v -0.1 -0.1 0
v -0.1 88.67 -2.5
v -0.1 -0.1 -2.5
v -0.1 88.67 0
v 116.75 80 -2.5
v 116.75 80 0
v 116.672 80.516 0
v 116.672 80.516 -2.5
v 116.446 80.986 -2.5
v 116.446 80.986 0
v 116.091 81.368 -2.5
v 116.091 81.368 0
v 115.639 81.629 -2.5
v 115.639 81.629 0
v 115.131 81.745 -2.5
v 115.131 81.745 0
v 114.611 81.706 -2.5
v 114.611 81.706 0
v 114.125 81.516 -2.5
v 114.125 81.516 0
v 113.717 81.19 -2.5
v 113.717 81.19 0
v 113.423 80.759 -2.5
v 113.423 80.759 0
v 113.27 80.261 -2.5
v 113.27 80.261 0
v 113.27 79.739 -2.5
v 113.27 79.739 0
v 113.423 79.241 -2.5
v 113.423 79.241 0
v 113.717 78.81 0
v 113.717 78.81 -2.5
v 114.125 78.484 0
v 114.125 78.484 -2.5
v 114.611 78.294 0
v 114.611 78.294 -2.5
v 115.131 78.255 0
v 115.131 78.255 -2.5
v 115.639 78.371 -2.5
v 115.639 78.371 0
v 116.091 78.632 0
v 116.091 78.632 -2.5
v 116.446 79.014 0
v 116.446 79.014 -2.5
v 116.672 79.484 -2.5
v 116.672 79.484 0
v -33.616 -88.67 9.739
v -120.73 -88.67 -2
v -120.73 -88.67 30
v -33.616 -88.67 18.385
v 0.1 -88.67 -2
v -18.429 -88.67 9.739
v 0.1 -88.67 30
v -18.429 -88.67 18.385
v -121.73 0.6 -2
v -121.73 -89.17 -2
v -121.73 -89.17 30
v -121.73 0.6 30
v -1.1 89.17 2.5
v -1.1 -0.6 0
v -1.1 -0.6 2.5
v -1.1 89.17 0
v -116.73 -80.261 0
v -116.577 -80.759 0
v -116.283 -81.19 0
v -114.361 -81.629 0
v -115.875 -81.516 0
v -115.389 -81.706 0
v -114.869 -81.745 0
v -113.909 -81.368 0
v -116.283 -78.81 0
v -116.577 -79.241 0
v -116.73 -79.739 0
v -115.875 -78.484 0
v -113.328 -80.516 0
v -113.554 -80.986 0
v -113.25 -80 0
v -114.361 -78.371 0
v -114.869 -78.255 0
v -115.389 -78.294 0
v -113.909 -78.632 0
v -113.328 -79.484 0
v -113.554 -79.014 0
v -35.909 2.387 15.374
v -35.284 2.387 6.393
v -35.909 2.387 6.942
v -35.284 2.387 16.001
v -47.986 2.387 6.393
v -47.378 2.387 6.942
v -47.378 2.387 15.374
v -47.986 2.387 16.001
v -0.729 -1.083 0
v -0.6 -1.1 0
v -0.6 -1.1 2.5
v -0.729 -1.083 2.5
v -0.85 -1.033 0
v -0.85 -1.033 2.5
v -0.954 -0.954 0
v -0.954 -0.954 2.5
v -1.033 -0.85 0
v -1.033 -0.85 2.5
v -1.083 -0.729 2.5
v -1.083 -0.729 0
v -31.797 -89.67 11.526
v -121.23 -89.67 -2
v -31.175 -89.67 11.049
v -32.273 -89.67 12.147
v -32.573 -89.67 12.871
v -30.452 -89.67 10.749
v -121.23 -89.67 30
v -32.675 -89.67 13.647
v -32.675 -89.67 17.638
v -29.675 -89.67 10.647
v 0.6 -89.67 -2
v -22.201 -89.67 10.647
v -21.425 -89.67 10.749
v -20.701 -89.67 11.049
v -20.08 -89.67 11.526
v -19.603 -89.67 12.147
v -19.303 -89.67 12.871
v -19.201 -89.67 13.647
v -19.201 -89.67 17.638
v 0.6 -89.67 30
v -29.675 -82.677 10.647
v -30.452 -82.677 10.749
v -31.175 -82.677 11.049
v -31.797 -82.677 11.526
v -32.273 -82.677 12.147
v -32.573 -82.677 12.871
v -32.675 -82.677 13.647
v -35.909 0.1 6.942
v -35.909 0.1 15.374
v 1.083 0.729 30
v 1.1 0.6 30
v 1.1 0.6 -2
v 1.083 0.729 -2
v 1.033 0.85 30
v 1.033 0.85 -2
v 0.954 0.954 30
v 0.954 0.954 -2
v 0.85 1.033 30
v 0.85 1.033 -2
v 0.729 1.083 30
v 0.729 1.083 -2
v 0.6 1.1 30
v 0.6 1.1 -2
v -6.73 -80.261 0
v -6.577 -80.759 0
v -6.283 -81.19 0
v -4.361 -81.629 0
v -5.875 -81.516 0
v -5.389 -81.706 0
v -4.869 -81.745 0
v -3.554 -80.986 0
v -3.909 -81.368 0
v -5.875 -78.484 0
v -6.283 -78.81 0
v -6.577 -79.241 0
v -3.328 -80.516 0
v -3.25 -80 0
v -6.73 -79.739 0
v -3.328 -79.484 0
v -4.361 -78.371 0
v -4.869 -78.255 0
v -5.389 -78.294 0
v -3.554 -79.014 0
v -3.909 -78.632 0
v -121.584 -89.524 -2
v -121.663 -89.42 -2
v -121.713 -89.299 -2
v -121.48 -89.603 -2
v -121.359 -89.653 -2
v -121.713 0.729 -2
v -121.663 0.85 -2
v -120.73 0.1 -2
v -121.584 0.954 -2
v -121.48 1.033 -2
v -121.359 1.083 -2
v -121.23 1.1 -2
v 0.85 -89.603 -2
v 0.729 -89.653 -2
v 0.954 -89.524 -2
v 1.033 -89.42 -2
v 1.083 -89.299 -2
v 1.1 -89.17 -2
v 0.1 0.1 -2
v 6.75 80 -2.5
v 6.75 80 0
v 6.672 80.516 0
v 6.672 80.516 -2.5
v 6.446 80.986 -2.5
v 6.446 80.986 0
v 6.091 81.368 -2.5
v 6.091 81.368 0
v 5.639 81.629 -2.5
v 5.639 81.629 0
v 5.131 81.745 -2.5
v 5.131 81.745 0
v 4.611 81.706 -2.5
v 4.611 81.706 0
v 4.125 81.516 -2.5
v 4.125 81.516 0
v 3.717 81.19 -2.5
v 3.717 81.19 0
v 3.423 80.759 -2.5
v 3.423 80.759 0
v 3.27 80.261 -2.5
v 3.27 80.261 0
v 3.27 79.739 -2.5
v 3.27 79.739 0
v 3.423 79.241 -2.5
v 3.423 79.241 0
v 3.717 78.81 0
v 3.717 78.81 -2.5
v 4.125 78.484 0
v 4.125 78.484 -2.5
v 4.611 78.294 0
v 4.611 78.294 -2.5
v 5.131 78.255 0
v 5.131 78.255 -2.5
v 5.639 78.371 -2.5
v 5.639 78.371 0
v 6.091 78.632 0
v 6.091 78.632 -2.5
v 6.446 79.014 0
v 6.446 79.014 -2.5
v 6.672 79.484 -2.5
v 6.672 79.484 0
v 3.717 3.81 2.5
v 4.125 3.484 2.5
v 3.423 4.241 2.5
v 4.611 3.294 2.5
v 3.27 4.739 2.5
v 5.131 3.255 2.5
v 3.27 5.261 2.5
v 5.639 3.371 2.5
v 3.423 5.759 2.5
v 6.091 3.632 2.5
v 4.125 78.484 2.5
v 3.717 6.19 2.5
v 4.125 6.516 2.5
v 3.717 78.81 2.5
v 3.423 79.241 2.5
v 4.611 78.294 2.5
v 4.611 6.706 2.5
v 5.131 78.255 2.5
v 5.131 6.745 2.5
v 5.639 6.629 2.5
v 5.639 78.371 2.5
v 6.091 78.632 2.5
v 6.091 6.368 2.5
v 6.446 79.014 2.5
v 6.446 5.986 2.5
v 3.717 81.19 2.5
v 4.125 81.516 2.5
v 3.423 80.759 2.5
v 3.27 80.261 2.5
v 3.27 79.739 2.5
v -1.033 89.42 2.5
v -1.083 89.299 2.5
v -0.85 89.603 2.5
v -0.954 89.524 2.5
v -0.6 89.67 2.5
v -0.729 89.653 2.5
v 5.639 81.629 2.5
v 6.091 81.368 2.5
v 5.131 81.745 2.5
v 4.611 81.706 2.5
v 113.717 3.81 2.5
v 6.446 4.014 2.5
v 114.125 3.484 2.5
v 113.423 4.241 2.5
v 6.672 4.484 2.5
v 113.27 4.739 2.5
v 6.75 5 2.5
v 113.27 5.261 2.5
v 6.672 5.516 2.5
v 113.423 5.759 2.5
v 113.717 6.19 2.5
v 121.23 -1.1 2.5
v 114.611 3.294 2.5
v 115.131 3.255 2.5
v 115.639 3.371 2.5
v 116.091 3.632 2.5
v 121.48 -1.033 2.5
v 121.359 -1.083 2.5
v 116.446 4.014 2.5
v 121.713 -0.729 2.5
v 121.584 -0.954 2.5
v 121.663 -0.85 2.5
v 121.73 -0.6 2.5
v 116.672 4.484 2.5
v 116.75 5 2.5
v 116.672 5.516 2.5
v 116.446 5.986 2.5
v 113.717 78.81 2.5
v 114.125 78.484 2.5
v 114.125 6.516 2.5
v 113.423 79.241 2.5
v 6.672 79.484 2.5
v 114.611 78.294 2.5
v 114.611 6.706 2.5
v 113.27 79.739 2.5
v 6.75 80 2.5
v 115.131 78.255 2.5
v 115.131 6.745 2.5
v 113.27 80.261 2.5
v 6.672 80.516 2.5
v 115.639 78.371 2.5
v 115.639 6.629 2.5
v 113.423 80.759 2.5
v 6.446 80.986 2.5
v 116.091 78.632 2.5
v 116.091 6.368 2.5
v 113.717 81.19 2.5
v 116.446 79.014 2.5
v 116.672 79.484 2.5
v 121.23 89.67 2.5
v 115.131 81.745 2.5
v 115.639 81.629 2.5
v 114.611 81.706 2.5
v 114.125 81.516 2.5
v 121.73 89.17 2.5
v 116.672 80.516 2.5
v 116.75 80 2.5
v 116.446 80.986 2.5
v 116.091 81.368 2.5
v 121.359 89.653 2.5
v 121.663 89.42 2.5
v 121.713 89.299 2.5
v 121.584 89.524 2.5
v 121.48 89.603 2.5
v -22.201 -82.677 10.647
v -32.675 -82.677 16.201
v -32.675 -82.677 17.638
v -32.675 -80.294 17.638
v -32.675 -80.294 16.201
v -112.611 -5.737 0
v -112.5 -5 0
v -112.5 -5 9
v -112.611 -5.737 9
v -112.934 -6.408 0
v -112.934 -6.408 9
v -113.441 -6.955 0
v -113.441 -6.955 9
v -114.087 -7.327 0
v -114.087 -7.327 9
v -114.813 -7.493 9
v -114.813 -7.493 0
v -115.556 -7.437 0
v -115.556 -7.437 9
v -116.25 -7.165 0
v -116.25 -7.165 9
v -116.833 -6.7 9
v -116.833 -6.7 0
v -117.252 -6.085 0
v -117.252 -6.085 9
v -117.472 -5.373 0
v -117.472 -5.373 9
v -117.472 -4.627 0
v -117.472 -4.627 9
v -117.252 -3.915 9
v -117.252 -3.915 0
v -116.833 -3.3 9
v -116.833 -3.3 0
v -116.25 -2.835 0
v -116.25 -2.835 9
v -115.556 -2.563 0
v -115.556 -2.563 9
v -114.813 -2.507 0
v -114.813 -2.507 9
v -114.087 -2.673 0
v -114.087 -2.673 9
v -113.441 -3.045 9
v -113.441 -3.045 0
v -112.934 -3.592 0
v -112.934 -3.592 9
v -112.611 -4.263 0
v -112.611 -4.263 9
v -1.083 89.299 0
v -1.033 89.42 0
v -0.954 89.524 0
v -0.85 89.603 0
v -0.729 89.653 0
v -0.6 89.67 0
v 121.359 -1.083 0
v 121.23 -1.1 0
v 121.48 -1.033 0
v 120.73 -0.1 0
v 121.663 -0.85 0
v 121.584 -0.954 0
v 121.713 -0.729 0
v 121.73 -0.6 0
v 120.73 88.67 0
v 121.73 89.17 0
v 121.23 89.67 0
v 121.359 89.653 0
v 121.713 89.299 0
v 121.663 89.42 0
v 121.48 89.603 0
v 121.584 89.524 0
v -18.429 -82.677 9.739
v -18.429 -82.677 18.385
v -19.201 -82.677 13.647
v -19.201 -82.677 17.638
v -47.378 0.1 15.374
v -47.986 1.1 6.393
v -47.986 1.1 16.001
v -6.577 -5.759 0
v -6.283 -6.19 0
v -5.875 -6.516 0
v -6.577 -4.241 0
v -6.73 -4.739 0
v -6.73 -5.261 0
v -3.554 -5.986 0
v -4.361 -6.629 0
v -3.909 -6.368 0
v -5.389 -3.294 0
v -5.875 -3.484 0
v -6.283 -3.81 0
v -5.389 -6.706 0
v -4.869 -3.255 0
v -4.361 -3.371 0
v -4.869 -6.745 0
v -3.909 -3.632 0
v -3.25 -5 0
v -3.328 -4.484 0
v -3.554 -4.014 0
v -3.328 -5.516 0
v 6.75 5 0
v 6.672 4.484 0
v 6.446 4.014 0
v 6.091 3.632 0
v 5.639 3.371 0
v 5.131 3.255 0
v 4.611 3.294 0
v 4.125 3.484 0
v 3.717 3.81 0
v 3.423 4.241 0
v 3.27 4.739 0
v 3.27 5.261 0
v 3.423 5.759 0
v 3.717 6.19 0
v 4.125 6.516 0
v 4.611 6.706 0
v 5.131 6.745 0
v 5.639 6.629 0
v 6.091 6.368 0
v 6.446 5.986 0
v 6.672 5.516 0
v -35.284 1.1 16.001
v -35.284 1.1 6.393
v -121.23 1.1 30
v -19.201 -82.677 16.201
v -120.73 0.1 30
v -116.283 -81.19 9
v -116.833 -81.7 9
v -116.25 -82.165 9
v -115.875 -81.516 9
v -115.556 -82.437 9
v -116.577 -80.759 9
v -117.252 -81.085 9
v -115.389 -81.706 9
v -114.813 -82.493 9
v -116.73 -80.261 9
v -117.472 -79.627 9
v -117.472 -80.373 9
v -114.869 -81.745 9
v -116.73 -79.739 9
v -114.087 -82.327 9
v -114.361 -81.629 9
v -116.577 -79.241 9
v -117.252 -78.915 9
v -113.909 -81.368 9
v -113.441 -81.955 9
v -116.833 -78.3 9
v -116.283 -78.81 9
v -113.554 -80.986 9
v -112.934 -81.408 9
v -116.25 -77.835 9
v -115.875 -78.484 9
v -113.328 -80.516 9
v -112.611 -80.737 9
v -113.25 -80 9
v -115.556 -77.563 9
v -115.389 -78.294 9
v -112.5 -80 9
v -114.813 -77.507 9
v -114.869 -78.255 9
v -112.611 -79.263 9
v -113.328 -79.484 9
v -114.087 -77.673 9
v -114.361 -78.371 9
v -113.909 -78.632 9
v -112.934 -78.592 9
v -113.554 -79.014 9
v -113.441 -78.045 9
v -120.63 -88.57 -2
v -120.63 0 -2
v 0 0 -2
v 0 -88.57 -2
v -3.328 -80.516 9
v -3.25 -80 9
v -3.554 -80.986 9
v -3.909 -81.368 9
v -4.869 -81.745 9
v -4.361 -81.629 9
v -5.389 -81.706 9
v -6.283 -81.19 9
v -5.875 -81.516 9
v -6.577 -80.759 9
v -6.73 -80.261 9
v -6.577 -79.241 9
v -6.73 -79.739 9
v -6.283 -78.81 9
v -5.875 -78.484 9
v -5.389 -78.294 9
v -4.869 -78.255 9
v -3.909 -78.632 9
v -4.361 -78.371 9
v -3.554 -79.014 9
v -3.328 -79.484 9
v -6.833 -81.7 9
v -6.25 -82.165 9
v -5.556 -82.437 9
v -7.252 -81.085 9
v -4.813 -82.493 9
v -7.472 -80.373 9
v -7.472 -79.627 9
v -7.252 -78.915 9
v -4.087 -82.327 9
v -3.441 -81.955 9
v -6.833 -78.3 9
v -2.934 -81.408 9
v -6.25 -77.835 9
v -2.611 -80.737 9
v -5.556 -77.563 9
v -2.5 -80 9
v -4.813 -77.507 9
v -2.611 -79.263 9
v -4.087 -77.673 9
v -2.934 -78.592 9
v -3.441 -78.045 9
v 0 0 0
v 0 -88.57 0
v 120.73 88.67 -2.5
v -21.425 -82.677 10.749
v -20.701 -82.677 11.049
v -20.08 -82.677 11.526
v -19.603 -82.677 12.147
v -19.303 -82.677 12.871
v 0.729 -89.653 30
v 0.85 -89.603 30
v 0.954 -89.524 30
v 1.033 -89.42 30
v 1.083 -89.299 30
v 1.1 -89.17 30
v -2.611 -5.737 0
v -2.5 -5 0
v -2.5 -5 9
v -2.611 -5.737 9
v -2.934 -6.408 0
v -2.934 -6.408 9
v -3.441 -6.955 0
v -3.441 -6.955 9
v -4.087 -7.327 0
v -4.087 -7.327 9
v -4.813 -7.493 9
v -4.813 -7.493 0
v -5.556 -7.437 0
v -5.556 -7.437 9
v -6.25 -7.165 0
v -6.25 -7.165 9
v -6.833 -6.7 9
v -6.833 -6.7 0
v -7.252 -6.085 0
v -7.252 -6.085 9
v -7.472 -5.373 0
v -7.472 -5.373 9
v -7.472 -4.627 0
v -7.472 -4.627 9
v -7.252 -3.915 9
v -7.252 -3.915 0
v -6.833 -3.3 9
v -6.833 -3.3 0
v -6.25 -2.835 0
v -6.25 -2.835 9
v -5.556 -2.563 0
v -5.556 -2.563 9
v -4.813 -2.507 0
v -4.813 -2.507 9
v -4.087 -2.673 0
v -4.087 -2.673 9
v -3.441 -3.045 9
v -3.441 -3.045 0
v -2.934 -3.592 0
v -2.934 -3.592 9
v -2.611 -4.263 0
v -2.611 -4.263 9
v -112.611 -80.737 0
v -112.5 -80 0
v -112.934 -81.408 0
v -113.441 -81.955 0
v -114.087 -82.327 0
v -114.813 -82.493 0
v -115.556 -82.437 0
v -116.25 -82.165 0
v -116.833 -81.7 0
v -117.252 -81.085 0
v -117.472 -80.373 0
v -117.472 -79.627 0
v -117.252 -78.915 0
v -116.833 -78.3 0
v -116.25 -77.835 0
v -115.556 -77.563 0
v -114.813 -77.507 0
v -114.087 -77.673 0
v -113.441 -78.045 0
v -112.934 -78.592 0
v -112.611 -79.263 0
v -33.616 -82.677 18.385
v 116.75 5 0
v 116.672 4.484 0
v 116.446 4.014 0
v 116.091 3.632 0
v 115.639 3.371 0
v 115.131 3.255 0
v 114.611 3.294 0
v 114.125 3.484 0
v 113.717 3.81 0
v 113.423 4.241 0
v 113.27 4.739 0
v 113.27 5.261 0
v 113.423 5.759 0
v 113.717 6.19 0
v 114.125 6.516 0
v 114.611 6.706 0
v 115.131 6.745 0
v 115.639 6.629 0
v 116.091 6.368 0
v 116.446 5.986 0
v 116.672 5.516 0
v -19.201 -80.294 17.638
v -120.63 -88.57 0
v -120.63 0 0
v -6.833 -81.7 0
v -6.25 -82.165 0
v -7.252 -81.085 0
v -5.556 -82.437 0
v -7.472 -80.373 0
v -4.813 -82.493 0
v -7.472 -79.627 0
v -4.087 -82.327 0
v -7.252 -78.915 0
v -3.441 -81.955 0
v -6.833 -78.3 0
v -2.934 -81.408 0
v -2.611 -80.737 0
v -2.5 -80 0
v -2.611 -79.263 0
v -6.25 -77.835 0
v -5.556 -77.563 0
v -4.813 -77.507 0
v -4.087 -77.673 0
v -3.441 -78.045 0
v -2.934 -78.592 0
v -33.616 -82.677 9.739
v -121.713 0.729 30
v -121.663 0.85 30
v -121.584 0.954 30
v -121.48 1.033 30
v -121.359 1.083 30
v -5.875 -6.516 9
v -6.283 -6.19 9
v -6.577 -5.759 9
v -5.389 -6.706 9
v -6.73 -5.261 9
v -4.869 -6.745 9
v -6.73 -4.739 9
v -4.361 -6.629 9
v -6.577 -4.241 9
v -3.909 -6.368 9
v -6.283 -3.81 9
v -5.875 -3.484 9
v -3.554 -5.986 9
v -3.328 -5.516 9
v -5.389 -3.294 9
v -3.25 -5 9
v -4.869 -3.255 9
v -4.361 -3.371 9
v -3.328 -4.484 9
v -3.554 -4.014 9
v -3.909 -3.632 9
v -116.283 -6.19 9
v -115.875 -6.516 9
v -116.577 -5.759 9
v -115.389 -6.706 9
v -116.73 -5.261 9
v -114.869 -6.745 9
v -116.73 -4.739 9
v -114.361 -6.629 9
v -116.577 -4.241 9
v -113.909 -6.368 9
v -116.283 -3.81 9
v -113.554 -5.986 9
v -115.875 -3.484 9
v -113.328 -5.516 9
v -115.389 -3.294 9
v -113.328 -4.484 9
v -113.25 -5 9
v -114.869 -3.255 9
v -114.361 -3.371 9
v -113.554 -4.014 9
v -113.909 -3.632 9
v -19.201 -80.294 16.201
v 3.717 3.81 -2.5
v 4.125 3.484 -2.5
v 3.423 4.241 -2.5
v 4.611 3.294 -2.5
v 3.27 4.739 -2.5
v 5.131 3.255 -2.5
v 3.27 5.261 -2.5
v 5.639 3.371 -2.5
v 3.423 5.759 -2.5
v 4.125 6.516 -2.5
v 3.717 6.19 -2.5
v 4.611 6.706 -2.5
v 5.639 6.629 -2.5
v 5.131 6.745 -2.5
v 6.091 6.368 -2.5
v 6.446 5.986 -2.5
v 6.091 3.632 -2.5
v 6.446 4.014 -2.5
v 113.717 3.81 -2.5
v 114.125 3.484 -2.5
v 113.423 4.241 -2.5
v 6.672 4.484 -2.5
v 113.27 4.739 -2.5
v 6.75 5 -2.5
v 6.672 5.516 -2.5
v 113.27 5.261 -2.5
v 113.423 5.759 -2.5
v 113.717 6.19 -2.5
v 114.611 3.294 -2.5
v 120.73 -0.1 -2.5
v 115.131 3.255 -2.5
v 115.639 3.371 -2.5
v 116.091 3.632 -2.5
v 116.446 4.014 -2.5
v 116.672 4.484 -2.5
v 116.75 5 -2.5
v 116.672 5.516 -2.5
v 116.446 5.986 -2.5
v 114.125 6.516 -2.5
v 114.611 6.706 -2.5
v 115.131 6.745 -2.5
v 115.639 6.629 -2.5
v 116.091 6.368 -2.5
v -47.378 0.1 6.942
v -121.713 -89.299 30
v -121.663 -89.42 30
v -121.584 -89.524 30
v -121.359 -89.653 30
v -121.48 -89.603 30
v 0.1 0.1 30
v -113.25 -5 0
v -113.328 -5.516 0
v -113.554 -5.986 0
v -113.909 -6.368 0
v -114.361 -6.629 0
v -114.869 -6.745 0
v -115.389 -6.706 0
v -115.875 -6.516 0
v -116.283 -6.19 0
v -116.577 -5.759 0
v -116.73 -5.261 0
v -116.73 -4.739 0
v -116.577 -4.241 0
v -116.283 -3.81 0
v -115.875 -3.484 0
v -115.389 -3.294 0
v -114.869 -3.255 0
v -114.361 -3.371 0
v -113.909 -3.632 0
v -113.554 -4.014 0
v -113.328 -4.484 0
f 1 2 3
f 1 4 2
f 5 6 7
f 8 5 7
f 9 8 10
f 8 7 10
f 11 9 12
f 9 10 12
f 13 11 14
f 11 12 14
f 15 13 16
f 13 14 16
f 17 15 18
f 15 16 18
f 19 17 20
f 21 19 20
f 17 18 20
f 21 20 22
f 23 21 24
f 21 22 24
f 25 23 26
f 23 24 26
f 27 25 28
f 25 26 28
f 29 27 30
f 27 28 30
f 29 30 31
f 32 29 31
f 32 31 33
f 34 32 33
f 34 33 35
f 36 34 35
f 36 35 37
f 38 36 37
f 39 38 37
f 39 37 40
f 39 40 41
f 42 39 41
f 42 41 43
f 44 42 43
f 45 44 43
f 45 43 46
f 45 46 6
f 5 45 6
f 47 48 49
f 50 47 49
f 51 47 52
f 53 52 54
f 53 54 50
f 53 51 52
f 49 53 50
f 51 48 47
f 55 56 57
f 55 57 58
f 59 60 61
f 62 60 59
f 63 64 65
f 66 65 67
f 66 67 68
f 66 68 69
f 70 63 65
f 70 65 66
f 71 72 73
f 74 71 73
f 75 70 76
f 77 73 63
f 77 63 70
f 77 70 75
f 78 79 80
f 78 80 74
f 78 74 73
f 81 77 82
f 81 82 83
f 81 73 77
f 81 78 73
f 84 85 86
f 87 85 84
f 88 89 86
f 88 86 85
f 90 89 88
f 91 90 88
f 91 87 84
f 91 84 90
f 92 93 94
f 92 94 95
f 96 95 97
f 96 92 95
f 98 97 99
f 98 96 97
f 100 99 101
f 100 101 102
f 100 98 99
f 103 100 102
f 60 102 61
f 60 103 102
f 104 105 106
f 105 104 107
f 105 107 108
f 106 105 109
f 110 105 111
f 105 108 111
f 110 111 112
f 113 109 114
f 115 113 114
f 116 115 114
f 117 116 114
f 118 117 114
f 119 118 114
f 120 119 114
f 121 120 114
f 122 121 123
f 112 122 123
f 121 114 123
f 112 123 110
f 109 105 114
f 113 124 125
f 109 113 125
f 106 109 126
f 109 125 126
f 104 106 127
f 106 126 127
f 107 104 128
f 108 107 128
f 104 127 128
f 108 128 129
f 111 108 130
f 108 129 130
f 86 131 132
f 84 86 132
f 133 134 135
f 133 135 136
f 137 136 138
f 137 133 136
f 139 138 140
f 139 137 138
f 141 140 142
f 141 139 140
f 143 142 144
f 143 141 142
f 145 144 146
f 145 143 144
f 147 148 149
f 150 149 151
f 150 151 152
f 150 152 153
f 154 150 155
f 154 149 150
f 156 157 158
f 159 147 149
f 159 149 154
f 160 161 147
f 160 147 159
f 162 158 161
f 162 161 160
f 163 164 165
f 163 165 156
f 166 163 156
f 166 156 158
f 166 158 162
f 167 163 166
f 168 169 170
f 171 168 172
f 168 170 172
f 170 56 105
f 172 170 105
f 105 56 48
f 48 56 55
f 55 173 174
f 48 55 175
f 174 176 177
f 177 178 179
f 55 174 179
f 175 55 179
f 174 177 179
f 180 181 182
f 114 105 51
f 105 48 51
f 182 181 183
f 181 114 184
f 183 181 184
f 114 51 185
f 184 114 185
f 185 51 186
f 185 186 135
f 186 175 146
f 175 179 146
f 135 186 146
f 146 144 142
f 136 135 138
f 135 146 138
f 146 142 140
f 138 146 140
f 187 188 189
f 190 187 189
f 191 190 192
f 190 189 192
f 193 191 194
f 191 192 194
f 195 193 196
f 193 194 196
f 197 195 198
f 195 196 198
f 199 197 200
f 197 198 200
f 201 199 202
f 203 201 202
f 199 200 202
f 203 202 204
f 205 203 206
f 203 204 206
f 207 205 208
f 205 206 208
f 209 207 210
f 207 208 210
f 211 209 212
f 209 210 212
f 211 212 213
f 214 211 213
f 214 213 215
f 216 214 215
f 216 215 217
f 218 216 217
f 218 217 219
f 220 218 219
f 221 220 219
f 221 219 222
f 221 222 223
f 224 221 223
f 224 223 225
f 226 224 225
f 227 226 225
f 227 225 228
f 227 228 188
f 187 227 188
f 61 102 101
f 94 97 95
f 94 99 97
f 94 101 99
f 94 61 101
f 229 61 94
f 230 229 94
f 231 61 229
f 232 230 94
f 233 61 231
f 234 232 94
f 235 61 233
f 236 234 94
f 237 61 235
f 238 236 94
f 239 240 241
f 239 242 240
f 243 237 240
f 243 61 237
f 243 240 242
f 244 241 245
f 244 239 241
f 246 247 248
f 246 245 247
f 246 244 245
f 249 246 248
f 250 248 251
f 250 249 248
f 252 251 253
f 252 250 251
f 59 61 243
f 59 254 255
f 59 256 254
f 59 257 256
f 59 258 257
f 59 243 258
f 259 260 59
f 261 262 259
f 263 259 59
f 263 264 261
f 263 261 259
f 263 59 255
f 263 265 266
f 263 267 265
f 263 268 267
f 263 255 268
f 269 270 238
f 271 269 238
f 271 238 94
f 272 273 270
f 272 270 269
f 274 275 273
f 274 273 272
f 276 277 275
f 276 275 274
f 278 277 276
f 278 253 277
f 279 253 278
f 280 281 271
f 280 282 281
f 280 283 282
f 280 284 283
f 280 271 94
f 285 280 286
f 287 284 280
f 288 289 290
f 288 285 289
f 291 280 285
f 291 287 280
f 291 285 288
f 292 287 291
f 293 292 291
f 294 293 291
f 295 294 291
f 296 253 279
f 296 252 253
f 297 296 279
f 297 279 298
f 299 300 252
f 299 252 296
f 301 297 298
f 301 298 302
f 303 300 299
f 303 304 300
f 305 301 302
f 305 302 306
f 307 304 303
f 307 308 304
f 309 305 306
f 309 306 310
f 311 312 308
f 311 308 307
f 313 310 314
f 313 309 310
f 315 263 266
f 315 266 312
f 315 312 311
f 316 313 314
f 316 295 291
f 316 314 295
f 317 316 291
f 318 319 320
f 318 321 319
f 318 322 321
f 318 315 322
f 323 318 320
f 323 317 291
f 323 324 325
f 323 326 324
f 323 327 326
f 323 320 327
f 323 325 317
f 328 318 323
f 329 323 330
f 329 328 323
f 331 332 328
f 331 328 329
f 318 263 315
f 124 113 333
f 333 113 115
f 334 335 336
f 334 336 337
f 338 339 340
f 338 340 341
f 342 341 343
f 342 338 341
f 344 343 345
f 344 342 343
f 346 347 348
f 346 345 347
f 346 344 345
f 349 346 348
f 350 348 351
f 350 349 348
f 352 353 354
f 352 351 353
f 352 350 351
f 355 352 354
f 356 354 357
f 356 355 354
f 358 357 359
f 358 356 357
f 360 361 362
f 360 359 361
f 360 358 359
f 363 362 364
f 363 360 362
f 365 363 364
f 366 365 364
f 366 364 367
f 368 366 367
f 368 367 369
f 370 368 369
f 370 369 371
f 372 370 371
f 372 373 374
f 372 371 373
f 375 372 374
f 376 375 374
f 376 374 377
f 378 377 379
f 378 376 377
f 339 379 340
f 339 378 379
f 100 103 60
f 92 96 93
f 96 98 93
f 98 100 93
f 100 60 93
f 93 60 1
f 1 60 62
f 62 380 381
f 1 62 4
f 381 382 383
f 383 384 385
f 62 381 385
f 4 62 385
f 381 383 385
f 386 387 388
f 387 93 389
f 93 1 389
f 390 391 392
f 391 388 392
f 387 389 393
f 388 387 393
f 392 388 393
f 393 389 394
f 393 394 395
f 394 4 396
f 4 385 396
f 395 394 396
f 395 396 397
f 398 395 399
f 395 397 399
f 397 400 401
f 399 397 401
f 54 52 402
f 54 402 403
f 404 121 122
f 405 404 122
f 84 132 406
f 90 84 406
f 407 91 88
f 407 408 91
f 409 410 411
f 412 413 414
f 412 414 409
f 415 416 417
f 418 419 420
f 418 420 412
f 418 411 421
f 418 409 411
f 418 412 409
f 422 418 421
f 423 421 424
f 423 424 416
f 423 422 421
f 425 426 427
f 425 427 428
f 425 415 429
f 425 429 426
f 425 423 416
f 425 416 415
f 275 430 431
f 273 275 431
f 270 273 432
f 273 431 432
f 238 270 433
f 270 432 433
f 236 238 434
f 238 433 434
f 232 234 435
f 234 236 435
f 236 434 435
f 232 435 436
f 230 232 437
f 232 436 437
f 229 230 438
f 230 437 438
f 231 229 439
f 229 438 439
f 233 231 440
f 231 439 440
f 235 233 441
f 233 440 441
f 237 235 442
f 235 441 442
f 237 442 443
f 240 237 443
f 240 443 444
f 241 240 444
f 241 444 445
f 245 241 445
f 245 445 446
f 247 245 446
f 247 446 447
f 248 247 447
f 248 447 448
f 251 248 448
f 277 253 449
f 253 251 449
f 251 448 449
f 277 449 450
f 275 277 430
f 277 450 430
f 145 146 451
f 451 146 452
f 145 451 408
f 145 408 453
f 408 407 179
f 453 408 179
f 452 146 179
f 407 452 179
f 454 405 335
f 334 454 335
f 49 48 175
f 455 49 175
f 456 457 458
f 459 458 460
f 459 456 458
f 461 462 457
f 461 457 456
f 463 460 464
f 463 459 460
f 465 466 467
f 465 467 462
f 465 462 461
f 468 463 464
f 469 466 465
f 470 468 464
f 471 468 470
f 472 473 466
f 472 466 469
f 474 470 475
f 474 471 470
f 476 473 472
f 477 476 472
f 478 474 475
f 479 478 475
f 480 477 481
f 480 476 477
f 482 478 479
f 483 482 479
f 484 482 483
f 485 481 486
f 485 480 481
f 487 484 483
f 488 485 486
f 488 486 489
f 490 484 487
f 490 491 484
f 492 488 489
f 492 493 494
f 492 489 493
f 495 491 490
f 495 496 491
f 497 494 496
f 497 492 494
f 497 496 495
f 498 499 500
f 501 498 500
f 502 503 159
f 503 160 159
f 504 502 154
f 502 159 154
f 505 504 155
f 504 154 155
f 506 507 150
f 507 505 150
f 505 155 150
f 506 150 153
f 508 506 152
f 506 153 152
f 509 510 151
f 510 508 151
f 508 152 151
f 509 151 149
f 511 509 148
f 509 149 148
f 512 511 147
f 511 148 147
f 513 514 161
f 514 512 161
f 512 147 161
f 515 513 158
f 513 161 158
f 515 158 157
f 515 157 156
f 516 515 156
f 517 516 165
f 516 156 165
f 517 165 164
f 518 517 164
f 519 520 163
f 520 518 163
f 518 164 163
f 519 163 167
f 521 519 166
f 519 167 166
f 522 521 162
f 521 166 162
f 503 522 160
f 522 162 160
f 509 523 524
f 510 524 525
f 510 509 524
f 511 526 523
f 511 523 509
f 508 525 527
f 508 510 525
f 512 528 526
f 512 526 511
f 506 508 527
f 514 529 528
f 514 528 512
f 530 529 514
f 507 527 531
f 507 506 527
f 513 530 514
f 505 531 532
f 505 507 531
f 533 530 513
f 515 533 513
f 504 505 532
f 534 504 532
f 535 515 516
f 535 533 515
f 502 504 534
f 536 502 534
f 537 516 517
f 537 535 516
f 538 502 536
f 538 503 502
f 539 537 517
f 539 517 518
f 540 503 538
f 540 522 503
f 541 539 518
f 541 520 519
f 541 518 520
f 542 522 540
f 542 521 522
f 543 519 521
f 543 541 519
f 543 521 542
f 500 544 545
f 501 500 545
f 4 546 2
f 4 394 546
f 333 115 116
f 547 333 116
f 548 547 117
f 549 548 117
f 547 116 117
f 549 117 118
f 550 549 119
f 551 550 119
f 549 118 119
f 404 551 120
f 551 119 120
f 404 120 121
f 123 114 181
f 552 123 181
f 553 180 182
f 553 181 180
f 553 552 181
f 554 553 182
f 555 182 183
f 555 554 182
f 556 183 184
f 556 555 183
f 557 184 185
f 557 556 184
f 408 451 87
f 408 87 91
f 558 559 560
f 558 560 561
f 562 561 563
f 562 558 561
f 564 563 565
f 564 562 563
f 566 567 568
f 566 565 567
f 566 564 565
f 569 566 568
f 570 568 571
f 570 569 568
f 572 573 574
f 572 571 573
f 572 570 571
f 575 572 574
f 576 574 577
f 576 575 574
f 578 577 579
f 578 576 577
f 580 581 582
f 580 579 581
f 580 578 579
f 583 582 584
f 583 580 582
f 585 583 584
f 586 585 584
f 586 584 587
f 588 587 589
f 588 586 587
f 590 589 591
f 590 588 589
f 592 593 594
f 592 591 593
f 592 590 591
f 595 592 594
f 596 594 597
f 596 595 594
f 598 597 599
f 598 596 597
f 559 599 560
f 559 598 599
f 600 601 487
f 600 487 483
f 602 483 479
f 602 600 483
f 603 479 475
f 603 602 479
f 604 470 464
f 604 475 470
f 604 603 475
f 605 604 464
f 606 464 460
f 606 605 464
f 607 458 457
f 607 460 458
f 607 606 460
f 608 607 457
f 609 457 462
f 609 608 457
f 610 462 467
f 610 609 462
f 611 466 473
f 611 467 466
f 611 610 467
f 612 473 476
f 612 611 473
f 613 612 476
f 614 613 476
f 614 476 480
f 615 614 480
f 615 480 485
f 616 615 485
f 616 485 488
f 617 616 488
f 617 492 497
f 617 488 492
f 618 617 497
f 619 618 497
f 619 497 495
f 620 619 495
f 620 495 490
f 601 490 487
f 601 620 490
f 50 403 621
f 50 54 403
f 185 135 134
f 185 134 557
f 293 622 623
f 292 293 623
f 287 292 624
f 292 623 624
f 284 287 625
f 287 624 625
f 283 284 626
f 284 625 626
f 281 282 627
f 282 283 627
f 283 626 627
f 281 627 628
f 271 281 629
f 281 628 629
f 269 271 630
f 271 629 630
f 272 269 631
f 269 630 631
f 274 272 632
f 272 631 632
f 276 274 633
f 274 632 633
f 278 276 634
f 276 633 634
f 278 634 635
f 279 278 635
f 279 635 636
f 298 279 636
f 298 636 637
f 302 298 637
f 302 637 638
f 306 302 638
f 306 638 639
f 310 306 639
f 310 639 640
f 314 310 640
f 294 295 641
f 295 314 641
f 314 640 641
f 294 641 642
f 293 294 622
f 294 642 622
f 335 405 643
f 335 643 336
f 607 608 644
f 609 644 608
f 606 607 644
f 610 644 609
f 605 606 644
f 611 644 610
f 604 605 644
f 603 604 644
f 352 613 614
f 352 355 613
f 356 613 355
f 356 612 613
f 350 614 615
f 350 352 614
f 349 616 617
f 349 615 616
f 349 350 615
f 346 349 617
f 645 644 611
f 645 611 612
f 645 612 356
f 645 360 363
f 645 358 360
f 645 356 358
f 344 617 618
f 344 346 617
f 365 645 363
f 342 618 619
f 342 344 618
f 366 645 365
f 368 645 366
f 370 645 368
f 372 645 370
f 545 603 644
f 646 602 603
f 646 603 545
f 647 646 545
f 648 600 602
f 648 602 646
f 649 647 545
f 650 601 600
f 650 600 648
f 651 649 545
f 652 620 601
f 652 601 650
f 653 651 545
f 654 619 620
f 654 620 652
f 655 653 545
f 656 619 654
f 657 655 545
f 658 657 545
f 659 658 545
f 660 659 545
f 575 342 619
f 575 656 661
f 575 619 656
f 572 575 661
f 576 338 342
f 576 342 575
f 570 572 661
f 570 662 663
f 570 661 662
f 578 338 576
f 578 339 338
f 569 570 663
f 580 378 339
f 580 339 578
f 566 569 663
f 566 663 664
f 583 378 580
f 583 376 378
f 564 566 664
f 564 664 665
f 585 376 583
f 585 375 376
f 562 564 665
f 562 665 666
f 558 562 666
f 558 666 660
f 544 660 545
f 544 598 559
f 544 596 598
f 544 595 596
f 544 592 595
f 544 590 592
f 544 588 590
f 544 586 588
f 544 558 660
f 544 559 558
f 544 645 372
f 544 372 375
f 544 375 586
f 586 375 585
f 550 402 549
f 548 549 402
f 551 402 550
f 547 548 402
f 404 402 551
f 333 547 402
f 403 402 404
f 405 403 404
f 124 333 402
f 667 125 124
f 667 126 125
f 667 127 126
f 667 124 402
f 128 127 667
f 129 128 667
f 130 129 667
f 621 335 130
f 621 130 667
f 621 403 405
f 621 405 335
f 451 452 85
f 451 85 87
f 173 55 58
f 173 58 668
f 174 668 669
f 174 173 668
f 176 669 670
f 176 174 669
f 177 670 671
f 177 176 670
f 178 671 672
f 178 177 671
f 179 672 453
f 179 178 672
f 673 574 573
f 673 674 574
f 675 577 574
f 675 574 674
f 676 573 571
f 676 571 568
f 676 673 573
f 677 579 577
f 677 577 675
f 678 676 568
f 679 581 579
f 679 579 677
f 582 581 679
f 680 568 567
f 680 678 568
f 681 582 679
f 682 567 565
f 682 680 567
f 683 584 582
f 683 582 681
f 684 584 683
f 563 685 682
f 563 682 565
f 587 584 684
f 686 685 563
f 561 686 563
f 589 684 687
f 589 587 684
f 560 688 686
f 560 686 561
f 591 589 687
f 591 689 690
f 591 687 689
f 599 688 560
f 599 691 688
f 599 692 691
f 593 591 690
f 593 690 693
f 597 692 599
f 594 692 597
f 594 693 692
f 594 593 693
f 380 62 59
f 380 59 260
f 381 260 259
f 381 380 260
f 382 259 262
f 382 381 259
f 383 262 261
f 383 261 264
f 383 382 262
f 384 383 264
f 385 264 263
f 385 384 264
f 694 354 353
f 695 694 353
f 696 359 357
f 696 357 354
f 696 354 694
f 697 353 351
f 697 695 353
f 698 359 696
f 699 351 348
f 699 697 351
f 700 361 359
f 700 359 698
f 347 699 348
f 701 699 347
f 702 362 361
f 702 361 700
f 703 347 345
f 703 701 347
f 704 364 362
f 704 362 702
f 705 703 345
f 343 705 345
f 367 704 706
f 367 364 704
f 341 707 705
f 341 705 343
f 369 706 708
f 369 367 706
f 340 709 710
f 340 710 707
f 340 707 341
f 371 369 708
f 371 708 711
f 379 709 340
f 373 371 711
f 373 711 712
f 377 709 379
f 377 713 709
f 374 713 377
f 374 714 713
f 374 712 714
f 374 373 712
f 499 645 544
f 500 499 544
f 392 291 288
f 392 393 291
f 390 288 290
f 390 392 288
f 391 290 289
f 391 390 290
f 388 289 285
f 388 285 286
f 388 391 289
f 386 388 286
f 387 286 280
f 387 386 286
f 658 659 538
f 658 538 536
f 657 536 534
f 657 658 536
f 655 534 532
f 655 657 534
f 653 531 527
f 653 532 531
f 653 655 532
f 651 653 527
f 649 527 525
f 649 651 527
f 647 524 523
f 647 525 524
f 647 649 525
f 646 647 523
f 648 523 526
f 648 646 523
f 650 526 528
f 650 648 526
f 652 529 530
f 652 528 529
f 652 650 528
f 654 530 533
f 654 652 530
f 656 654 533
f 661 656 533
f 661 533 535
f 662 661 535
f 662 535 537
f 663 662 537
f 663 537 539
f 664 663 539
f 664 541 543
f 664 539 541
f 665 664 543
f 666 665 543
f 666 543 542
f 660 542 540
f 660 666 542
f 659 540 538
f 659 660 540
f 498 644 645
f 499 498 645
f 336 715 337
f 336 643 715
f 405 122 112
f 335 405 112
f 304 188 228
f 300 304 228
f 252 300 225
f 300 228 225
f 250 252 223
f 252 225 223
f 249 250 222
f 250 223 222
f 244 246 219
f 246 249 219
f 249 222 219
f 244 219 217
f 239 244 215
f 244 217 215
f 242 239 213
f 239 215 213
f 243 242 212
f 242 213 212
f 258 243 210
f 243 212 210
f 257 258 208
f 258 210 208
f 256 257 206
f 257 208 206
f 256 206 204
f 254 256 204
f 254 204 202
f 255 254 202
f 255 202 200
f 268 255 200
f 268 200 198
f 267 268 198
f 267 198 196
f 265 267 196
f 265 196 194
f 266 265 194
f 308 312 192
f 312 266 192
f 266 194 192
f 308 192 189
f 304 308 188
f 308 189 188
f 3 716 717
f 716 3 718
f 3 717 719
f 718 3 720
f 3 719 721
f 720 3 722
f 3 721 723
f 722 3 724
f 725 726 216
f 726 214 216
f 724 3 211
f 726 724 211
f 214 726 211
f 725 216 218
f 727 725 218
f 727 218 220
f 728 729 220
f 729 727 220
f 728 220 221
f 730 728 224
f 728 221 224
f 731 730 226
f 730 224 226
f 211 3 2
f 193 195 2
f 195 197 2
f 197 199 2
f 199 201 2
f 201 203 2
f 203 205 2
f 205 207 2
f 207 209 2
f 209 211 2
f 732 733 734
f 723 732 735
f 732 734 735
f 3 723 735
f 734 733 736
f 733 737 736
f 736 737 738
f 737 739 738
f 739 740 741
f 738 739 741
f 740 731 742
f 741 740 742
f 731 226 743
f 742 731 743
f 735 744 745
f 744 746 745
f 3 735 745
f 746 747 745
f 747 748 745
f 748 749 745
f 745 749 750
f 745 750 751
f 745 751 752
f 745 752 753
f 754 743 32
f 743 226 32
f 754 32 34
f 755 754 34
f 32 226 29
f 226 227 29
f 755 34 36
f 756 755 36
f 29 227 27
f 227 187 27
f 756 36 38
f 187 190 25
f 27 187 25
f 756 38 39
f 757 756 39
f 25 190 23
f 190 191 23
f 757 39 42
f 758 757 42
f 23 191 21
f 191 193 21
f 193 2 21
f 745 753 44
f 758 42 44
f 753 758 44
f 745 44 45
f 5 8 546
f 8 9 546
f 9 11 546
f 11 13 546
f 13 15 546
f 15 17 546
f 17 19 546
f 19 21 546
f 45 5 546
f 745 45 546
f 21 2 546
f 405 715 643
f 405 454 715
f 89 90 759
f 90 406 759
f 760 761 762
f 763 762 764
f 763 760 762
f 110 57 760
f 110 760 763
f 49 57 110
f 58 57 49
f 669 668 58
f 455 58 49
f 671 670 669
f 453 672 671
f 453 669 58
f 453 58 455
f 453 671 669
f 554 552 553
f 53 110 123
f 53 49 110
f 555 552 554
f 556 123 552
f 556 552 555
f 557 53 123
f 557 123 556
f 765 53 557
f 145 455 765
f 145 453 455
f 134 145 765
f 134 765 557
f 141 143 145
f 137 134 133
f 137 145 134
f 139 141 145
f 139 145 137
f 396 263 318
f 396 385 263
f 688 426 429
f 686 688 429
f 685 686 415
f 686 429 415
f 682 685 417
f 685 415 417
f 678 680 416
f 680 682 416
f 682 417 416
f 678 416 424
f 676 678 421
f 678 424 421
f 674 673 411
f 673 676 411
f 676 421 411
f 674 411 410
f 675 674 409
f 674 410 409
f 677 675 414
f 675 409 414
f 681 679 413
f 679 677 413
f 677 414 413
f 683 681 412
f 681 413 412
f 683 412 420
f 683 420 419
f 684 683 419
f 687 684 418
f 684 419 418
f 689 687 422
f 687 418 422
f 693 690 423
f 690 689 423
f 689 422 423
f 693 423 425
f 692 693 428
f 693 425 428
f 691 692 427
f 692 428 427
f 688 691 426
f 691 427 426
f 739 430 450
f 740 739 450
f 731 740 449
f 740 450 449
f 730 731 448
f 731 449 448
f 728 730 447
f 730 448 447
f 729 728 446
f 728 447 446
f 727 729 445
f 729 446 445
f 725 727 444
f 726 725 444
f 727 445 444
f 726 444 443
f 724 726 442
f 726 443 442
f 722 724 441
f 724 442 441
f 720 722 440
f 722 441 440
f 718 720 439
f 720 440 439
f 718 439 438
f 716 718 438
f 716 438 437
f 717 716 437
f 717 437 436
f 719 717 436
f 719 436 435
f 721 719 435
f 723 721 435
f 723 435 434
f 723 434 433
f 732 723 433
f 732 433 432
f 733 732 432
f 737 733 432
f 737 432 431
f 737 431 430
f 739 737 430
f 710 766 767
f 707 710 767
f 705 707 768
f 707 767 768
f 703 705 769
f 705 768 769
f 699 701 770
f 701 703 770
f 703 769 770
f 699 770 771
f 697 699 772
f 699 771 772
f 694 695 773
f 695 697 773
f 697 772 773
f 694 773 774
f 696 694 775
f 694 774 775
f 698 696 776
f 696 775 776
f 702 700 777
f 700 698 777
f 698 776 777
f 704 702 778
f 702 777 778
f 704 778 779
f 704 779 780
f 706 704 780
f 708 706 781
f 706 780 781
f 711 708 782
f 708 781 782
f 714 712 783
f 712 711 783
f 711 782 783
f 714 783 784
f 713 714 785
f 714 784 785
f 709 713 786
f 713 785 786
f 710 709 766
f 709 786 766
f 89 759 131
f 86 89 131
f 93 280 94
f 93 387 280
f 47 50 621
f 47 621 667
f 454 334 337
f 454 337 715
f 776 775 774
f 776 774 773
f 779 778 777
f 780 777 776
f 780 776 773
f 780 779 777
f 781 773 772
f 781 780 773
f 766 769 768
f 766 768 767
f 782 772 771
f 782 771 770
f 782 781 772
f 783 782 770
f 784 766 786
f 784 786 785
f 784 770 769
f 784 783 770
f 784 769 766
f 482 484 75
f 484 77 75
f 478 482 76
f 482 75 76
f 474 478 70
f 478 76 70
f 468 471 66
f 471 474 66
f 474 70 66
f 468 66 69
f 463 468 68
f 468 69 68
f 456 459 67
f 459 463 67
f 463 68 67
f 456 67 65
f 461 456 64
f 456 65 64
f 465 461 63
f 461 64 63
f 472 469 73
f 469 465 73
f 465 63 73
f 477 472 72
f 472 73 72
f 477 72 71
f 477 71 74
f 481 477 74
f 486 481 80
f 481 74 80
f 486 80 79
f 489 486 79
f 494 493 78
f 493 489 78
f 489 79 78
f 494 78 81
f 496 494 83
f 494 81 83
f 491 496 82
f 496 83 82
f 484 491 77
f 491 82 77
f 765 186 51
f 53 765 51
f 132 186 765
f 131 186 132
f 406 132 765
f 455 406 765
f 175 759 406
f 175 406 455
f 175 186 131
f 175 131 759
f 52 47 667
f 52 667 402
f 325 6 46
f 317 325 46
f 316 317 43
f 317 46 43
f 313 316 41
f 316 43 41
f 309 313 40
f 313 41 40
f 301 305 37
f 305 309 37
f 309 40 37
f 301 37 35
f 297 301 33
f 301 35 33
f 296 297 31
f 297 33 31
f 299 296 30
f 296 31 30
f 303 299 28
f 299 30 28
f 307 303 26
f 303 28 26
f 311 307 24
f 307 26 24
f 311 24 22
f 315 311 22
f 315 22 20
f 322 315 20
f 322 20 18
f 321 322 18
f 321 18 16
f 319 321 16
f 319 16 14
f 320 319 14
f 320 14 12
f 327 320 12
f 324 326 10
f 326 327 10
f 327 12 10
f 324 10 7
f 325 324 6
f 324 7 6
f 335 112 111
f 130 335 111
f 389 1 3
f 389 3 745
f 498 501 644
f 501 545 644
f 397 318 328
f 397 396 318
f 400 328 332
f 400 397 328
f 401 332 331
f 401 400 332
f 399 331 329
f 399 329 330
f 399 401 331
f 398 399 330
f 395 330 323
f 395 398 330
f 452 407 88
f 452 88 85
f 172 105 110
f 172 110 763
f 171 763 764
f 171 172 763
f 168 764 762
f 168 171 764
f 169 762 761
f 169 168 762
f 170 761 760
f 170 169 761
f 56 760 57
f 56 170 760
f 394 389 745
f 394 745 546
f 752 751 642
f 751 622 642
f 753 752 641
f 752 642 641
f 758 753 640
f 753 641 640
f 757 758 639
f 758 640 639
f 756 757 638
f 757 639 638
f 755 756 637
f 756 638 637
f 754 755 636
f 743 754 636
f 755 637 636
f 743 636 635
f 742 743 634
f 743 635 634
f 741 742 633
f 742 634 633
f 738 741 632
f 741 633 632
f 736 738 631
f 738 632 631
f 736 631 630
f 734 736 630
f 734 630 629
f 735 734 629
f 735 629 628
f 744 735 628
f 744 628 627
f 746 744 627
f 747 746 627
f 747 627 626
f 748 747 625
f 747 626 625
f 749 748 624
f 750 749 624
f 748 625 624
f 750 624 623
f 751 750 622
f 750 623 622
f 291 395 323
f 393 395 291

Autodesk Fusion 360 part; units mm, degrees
sketch "Sketch 2" plane through (0, 0, 0) normal (0, 0, 1) x (1, 0, 0)
  circle A0 centre (5, 80) radius 1.75
  line L0 (-0.1, -0.1) -> (120.73, -0.1)
  arc A1 (-0.6, -1.1) -> (-1.1, -0.6) centre (-0.6, -0.6) cw
  line L1 (-1.1, -0.6) -> (-1.1, 89.17)
  arc A2 (-1.1, 89.17) -> (-0.6, 89.67) centre (-0.6, 89.17) cw
  line L2 (121.73, 89.17) -> (121.73, -0.6)
  circle A3 centre (115, 80) radius 1.75
  line L3 (120.73, -0.1) -> (120.73, 88.67)
  line L4 (120.73, 88.67) -> (-0.1, 88.67)
  circle A4 centre (115, 5) radius 1.75
  circle A5 centre (5, 5) radius 1.75
  line L5 (121.23, -1.1) -> (-0.6, -1.1)
  arc A6 (121.23, 89.67) -> (121.73, 89.17) centre (121.23, 89.17) cw
  line L6 (-0.1, 88.67) -> (-0.1, -0.1)
  arc A7 (121.73, -0.6) -> (121.23, -1.1) centre (121.23, -0.6) cw
  line L7 (-0.6, 89.67) -> (121.23, 89.67)
  line L8 (-0.1, 88.67) -> (120.73, 88.67)
  line L9 (120.73, 88.67) -> (120.73, -0.1)
  line L10 (120.73, -0.1) -> (-0.1, -0.1)
  line L11 (-0.1, -0.1) -> (-0.1, 88.67)
  dimension "d1" = 1
extrude "Extrude1" add sketch "Sketch 2" along normal blind 2.5 contours L0 L3 L4 L6 L8 L9 L10 L11 | A1 L1 A2 L2 L5 A6 A7 L7
extrude "Extrude2" add sketch "Sketch 2" against normal blind 2.5 contours L0 L3 L4 L6 L8 L9 L10 L11

Autodesk Fusion 360 part; units mm, degrees
sketch "Sketch 1" plane through (0, 0, 0) normal (0, 0, 1) x (1, 0, 0)
  line L0 (-120.63, -88.57) -> (-120.63, 0)
  circle A0 centre (-115, -5) radius 1.75
  line L1 (0, 0) -> (0, -88.57)
  circle A1 centre (-115, -80) radius 1.75
  line L2 (-120.63, 0) -> (0, 0)
  circle A2 centre (-5, -80) radius 1.75
  line L3 (0, -88.57) -> (-120.63, -88.57)
  circle A3 centre (-5, -5) radius 1.75
  line L4 (0.1, -88.67) -> (-120.73, -88.67)
  line L5 (-120.73, -88.67) -> (-120.73, 0.1)
  line L6 (-120.73, 0.1) -> (0.1, 0.1)
  line L7 (0.1, 0.1) -> (0.1, -88.67)
  line L8 (1.1, -89.67) -> (-121.73, -89.67)
  line L9 (-121.73, -89.67) -> (-121.73, 1.1)
  line L10 (-121.73, 1.1) -> (1.1, 1.1)
  line L11 (1.1, 1.1) -> (1.1, -89.67)
  circle A4 centre (-115, -5) radius 2.5
  circle A5 centre (-115, -80) radius 2.5
  circle A6 centre (-5, -80) radius 2.5
  circle A7 centre (-5, -5) radius 2.5
  dimension "d1" = -0.1
  dimension "d2" = -1.1
  dimension "d7" = 5
  dimension "d8" = 5
  dimension "d9" = 5
  dimension "d10" = 5
extrude "Extrude1" add sketch "Sketch 1" against normal blind 2 contours L0 L1 L2 L3 | A0 | A1 | A2 | A3 | L8 L9 L10 L11 | A4 | A5 | A6 | A7 makes body 1 at (-40.21, -29.5233, 0) makes body 2 at (-40.1767, 0.7667, 0)
extrude "Extrude2" add sketch "Sketch 1" along normal blind 35 contours L8 L9 L10 L11 bodies 2
extrude "Extrude4" add sketch "Sketch 1" along normal blind 4 contours A4 | A5 | A6 | A7 bodies 1
extrude "Extrude5" add 4 faces at (-2.7658, -5.2111, 4) (-113.9872, -7.0026, 4) (-117.1045, -80.7791, 4) (-2.7593, -80.1242, 4) along direction (0, 0, 1) blind 3 on bodies 1 bodies 1
extrude "Extrude6" add 4 faces at (-113.9872, -7.0026, 7) (-2.7658, -5.2111, 7) (-117.1045, -80.7791, 7) (-2.7593, -80.1242, 7) along direction (0, 0, 1) blind 2 on bodies 1 bodies 1
extrude "Extrude7" cut 1 faces at (-40.1767, 0.7667, 35) along direction (0, 0, -1) blind 10 on bodies 2 bodies 2
extrude "Extrude8" add 1 faces at (-40.1767, 0.7667, 25) along direction (0, 0, 1) blind 5 on bodies 2 bodies 2
sketch "Sketch3" plane through (0, -89.67, 0) normal (0, -1, 0) x (1, 0, 0)
  line L0 (-121.73, 30) -> (-121.73, -2)
  line L1 (-121.73, -2) -> (1.1, -2)
  line L2 (1.1, -2) -> (1.1, 30)
  line L3 (1.1, 30) -> (-121.73, 30)
  line L4 (1.1, 5.8274) -> (-16.9, 5.8274) construction
  line L5 (-17.1151, -2) -> (-17.1151, 6) construction
  line L6 (-17.1151, 6) -> (-31.8464, 6)
  line L7 (-31.8464, 6) -> (-31.8464, 13)
  line L8 (-31.8464, 13) -> (-17.1151, 13)
  line L9 (-17.1151, 13) -> (-17.1151, 6)
  dimension "d23" = 18
  dimension "d24" = 8
  dimension "d25" = 7
extrude "Extrude9" cut sketch "Sketch3" along normal blind 5.784 from surface at -1 contours L6 L7 L8 L9 bodies 2
extrude "Extrude10" add 1 faces at (-22.0255, -89.0033, 6) along direction (0, 0, 1) blind 2.752 on bodies 2 bodies 2
extrude "Extrude11" cut 1 faces at (-26.936, -89.0033, 13) along direction (0, 0, 1) blind 2.948 on bodies 2 bodies 2
extrude "Extrude12" cut 1 faces at (-26.936, -89.0033, 15.948) along direction (0, 0, 1) blind 1.69 on bodies 2 bodies 2
extrude "Extrude13" add 1 faces at (-22.0255, -89.0033, 8.752) along direction (0, 0, 1) blind 1.895 on bodies 2 bodies 2
extrude "Extrude14" add 1 faces at (-17.1151, -89.0033, 15.3077) along direction (-1, 0, 0) blind 2.086 on bodies 2 bodies 2
extrude "Extrude15" cut 1 faces at (-31.8464, -89.0033, 12.9773) along direction (-1, 0, 0) blind 0.829 on bodies 2 bodies 2
sketch "Sketch4" plane through (0, -88.67, 0) normal (0, 1, 0) x (-1, 0, 0)
  line L0 (32.6754, 10.647) -> (19.2011, 10.647)
  line L1 (19.2011, 10.647) -> (19.2011, 17.638)
  line L2 (19.2011, 17.638) -> (32.6754, 17.638)
  line L3 (32.6754, 17.638) -> (32.6754, 10.647)
  line L4 (-0.1, 30) -> (-0.1, -2)
  line L5 (-0.1, -2) -> (120.73, -2)
  line L6 (120.73, -2) -> (120.73, 30)
  line L7 (120.73, 30) -> (-0.1, 30)
  line L8 (18.4293, 18.3854) -> (33.6158, 18.3854)
  line L9 (33.6158, 18.3854) -> (33.6158, 9.7391)
  line L10 (33.6158, 9.7391) -> (18.4293, 9.7391)
  line L11 (18.4293, 9.7391) -> (18.4293, 18.3854)
extrude "Extrude16" add sketch "Sketch4" along normal blind 12.179 contours L8 L9 L10 L11 bodies 2
extrude "Extrude17" cut 1 faces at (-33.3023, -76.491, 12.9239) along direction (0, -1, 0) blind 6.186 on bodies 2 bodies 2
fillet "Fillet1" radius 0.5 1 edges at (1.1, 1.1, 14) on bodies 2
fillet "Fillet2" radius 0.5 1 edges at (1.1, -89.67, 14) on bodies 2
fillet "Fillet3" radius 0.5 1 edges at (-121.73, 1.1, 14) on bodies 2
fillet "Fillet4" radius 0.5 1 edges at (-121.73, -89.67, 14) on bodies 2
fillet "Fillet5" radius 3 1 edges at (-19.2011, -86.1735, 10.647) on bodies 2
fillet "Fillet6" radius 3 1 edges at (-32.6754, -86.1735, 10.647) on bodies 2
sketch "Sketch5" plane through (0, -82.677, 0) normal (0, 1, 0) x (-1, 0, 0)
  line L0 (19.2011, 17.638) -> (32.6754, 17.638)
  line L1 (32.6754, 17.638) -> (32.6754, 13.647)
  arc A0 (29.6754, 10.647) -> (32.6754, 13.647) centre (29.6754, 13.647) ccw
  line L2 (29.6754, 10.647) -> (22.2011, 10.647)
  arc A1 (19.2011, 13.647) -> (22.2011, 10.647) centre (22.2011, 13.647) ccw
  line L3 (19.2011, 13.647) -> (19.2011, 17.638)
  line L4 (18.4293, 9.7391) -> (33.6158, 9.7391)
  line L5 (33.6158, 9.7391) -> (33.6158, 18.3854)
  line L6 (33.6158, 18.3854) -> (18.4293, 18.3854)
  line L7 (18.4293, 18.3854) -> (18.4293, 9.7391)
  line L8 (19.2011, 17.638) -> (32.6754, 17.638)
  line L9 (32.6754, 17.638) -> (32.6754, 16.201)
  line L10 (32.6754, 16.201) -> (19.2011, 16.201)
  line L11 (19.2011, 16.201) -> (19.2011, 17.638)
extrude "Extrude18" add sketch "Sketch5" along normal blind 2.383 separate body contours L0 L1 L3 L8 L9 L10 L11 makes body 3
sketch "Sketch6" plane through (0, -82.677, 0) normal (0, 1, 0) x (-1, 0, 0)
  line L0 (19.2011, 17.638) -> (32.6754, 17.638)
  line L1 (32.6754, 17.638) -> (32.6754, 13.647)
  arc A0 (29.6754, 10.647) -> (32.6754, 13.647) centre (29.6754, 13.647) ccw
  line L2 (29.6754, 10.647) -> (22.2011, 10.647)
  arc A1 (19.2011, 13.647) -> (22.2011, 10.647) centre (22.2011, 13.647) ccw
  line L3 (19.2011, 13.647) -> (19.2011, 17.638)
  line L4 (18.4293, 9.7391) -> (33.6158, 9.7391)
  line L5 (33.6158, 9.7391) -> (33.6158, 18.3854)
  line L6 (33.6158, 18.3854) -> (18.4293, 18.3854)
  line L7 (18.4293, 18.3854) -> (18.4293, 9.7391)
sketch "Sketch7" plane through (0, -82.677, 0) normal (0, 1, 0) x (-1, 0, 0)
sketch "Sketch8" plane through (0, -82.677, 0) normal (0, 1, 0) x (-1, 0, 0)
sketch "Sketch9" plane through (0, -82.677, 0) normal (0, 1, 0) x (-1, 0, 0)
sketch "Sketch10" plane through (0, -88.67, 0) normal (0, 1, 0) x (-1, 0, 0)
sketch "Sketch11" plane through (0, 1.1, 0) normal (0, 1, 0) x (-1, 0, 0)
  line L0 (121.23, -2) -> (121.23, 30)
  line L1 (121.23, 30) -> (-0.6, 30)
  line L2 (-0.6, 30) -> (-0.6, -2)
  line L3 (-0.6, -2) -> (121.23, -2)
  line L4 (19.1502, 15.374) -> (32.0205, 15.374)
  line L5 (32.0205, 15.374) -> (32.0205, 4.3423)
  line L6 (32.0205, 4.3423) -> (19.1502, 4.3423)
  line L7 (19.1502, 4.3423) -> (19.1502, 15.374)
extrude "Extrude19" cut sketch "Sketch11" along normal blind 7.369 from surface at -1 contours L4 L5 L6 L7 bodies 2
extrude "Extrude20" cut 1 faces at (-32.0205, 0.4333, 11.6967) along direction (-1, 0, 0) blind 22.557 on bodies 2 bodies 2
extrude "Extrude21" add 1 faces at (-19.1502, 0.4333, 8.0195) along direction (-1, 0, 0) blind 20.425 on bodies 2 bodies 2
extrude "Extrude22" cut 1 faces at (-39.5752, 0.4333, 8.0195) along direction (1, 0, 0) blind 4.126 on bodies 2 bodies 2
extrude "Extrude23" add 1 faces at (-54.5775, 0.4333, 11.6967) along direction (1, 0, 0) blind 5.127 on bodies 2 bodies 2
extrude "Extrude24" add 1 faces at (-44.7834, 0.4333, 4.3423) along direction (0, 0, 1) blind 0.064 on bodies 2 bodies 2
extrude "Extrude25" add 1 faces at (-49.4505, 0.4333, 11.7181) along direction (1, 0, 0) blind 2.072 on bodies 2 bodies 2
extrude "Extrude26" add 1 faces at (-35.4492, 0.7667, 8.0622) along direction (-1, 0, 0) blind 0.46 on bodies 2 bodies 2
extrude "Extrude27" add 1 faces at (-43.5554, 0.4333, 4.4063) along direction (0, 0, 1) blind 1.078 on bodies 2 bodies 2
extrude "Extrude28" add 1 faces at (-43.5554, 0.4333, 5.4843) along direction (0, 0, 1) blind 1.458 on bodies 2 bodies 2
sketch "Sketch12" plane through (0, 1.1, 0) normal (0, 1, 0) x (-1, 0, 0)
  line L0 (35.9092, 15.374) -> (47.3785, 15.374)
  line L1 (47.3785, 15.374) -> (47.3785, 6.9423)
  line L2 (47.3785, 6.9423) -> (35.9092, 6.9423)
  line L3 (35.9092, 6.9423) -> (35.9092, 15.374)
  line L4 (121.23, -2) -> (121.23, 30)
  line L5 (121.23, 30) -> (-0.6, 30)
  line L6 (-0.6, 30) -> (-0.6, -2)
  line L7 (-0.6, -2) -> (121.23, -2)
  line L8 (35.2835, 16.0008) -> (47.986, 16.0008)
  line L9 (47.986, 16.0008) -> (47.986, 6.3931)
  line L10 (47.986, 6.3931) -> (35.2835, 6.3931)
  line L11 (35.2835, 6.3931) -> (35.2835, 16.0008)
  dimension "d74" = 12.7025
extrude "Extrude29" add sketch "Sketch12" along normal blind 1.287 contours L8 L9 L10 L11 bodies 2
extrude "Extrude3" [suppressed]
